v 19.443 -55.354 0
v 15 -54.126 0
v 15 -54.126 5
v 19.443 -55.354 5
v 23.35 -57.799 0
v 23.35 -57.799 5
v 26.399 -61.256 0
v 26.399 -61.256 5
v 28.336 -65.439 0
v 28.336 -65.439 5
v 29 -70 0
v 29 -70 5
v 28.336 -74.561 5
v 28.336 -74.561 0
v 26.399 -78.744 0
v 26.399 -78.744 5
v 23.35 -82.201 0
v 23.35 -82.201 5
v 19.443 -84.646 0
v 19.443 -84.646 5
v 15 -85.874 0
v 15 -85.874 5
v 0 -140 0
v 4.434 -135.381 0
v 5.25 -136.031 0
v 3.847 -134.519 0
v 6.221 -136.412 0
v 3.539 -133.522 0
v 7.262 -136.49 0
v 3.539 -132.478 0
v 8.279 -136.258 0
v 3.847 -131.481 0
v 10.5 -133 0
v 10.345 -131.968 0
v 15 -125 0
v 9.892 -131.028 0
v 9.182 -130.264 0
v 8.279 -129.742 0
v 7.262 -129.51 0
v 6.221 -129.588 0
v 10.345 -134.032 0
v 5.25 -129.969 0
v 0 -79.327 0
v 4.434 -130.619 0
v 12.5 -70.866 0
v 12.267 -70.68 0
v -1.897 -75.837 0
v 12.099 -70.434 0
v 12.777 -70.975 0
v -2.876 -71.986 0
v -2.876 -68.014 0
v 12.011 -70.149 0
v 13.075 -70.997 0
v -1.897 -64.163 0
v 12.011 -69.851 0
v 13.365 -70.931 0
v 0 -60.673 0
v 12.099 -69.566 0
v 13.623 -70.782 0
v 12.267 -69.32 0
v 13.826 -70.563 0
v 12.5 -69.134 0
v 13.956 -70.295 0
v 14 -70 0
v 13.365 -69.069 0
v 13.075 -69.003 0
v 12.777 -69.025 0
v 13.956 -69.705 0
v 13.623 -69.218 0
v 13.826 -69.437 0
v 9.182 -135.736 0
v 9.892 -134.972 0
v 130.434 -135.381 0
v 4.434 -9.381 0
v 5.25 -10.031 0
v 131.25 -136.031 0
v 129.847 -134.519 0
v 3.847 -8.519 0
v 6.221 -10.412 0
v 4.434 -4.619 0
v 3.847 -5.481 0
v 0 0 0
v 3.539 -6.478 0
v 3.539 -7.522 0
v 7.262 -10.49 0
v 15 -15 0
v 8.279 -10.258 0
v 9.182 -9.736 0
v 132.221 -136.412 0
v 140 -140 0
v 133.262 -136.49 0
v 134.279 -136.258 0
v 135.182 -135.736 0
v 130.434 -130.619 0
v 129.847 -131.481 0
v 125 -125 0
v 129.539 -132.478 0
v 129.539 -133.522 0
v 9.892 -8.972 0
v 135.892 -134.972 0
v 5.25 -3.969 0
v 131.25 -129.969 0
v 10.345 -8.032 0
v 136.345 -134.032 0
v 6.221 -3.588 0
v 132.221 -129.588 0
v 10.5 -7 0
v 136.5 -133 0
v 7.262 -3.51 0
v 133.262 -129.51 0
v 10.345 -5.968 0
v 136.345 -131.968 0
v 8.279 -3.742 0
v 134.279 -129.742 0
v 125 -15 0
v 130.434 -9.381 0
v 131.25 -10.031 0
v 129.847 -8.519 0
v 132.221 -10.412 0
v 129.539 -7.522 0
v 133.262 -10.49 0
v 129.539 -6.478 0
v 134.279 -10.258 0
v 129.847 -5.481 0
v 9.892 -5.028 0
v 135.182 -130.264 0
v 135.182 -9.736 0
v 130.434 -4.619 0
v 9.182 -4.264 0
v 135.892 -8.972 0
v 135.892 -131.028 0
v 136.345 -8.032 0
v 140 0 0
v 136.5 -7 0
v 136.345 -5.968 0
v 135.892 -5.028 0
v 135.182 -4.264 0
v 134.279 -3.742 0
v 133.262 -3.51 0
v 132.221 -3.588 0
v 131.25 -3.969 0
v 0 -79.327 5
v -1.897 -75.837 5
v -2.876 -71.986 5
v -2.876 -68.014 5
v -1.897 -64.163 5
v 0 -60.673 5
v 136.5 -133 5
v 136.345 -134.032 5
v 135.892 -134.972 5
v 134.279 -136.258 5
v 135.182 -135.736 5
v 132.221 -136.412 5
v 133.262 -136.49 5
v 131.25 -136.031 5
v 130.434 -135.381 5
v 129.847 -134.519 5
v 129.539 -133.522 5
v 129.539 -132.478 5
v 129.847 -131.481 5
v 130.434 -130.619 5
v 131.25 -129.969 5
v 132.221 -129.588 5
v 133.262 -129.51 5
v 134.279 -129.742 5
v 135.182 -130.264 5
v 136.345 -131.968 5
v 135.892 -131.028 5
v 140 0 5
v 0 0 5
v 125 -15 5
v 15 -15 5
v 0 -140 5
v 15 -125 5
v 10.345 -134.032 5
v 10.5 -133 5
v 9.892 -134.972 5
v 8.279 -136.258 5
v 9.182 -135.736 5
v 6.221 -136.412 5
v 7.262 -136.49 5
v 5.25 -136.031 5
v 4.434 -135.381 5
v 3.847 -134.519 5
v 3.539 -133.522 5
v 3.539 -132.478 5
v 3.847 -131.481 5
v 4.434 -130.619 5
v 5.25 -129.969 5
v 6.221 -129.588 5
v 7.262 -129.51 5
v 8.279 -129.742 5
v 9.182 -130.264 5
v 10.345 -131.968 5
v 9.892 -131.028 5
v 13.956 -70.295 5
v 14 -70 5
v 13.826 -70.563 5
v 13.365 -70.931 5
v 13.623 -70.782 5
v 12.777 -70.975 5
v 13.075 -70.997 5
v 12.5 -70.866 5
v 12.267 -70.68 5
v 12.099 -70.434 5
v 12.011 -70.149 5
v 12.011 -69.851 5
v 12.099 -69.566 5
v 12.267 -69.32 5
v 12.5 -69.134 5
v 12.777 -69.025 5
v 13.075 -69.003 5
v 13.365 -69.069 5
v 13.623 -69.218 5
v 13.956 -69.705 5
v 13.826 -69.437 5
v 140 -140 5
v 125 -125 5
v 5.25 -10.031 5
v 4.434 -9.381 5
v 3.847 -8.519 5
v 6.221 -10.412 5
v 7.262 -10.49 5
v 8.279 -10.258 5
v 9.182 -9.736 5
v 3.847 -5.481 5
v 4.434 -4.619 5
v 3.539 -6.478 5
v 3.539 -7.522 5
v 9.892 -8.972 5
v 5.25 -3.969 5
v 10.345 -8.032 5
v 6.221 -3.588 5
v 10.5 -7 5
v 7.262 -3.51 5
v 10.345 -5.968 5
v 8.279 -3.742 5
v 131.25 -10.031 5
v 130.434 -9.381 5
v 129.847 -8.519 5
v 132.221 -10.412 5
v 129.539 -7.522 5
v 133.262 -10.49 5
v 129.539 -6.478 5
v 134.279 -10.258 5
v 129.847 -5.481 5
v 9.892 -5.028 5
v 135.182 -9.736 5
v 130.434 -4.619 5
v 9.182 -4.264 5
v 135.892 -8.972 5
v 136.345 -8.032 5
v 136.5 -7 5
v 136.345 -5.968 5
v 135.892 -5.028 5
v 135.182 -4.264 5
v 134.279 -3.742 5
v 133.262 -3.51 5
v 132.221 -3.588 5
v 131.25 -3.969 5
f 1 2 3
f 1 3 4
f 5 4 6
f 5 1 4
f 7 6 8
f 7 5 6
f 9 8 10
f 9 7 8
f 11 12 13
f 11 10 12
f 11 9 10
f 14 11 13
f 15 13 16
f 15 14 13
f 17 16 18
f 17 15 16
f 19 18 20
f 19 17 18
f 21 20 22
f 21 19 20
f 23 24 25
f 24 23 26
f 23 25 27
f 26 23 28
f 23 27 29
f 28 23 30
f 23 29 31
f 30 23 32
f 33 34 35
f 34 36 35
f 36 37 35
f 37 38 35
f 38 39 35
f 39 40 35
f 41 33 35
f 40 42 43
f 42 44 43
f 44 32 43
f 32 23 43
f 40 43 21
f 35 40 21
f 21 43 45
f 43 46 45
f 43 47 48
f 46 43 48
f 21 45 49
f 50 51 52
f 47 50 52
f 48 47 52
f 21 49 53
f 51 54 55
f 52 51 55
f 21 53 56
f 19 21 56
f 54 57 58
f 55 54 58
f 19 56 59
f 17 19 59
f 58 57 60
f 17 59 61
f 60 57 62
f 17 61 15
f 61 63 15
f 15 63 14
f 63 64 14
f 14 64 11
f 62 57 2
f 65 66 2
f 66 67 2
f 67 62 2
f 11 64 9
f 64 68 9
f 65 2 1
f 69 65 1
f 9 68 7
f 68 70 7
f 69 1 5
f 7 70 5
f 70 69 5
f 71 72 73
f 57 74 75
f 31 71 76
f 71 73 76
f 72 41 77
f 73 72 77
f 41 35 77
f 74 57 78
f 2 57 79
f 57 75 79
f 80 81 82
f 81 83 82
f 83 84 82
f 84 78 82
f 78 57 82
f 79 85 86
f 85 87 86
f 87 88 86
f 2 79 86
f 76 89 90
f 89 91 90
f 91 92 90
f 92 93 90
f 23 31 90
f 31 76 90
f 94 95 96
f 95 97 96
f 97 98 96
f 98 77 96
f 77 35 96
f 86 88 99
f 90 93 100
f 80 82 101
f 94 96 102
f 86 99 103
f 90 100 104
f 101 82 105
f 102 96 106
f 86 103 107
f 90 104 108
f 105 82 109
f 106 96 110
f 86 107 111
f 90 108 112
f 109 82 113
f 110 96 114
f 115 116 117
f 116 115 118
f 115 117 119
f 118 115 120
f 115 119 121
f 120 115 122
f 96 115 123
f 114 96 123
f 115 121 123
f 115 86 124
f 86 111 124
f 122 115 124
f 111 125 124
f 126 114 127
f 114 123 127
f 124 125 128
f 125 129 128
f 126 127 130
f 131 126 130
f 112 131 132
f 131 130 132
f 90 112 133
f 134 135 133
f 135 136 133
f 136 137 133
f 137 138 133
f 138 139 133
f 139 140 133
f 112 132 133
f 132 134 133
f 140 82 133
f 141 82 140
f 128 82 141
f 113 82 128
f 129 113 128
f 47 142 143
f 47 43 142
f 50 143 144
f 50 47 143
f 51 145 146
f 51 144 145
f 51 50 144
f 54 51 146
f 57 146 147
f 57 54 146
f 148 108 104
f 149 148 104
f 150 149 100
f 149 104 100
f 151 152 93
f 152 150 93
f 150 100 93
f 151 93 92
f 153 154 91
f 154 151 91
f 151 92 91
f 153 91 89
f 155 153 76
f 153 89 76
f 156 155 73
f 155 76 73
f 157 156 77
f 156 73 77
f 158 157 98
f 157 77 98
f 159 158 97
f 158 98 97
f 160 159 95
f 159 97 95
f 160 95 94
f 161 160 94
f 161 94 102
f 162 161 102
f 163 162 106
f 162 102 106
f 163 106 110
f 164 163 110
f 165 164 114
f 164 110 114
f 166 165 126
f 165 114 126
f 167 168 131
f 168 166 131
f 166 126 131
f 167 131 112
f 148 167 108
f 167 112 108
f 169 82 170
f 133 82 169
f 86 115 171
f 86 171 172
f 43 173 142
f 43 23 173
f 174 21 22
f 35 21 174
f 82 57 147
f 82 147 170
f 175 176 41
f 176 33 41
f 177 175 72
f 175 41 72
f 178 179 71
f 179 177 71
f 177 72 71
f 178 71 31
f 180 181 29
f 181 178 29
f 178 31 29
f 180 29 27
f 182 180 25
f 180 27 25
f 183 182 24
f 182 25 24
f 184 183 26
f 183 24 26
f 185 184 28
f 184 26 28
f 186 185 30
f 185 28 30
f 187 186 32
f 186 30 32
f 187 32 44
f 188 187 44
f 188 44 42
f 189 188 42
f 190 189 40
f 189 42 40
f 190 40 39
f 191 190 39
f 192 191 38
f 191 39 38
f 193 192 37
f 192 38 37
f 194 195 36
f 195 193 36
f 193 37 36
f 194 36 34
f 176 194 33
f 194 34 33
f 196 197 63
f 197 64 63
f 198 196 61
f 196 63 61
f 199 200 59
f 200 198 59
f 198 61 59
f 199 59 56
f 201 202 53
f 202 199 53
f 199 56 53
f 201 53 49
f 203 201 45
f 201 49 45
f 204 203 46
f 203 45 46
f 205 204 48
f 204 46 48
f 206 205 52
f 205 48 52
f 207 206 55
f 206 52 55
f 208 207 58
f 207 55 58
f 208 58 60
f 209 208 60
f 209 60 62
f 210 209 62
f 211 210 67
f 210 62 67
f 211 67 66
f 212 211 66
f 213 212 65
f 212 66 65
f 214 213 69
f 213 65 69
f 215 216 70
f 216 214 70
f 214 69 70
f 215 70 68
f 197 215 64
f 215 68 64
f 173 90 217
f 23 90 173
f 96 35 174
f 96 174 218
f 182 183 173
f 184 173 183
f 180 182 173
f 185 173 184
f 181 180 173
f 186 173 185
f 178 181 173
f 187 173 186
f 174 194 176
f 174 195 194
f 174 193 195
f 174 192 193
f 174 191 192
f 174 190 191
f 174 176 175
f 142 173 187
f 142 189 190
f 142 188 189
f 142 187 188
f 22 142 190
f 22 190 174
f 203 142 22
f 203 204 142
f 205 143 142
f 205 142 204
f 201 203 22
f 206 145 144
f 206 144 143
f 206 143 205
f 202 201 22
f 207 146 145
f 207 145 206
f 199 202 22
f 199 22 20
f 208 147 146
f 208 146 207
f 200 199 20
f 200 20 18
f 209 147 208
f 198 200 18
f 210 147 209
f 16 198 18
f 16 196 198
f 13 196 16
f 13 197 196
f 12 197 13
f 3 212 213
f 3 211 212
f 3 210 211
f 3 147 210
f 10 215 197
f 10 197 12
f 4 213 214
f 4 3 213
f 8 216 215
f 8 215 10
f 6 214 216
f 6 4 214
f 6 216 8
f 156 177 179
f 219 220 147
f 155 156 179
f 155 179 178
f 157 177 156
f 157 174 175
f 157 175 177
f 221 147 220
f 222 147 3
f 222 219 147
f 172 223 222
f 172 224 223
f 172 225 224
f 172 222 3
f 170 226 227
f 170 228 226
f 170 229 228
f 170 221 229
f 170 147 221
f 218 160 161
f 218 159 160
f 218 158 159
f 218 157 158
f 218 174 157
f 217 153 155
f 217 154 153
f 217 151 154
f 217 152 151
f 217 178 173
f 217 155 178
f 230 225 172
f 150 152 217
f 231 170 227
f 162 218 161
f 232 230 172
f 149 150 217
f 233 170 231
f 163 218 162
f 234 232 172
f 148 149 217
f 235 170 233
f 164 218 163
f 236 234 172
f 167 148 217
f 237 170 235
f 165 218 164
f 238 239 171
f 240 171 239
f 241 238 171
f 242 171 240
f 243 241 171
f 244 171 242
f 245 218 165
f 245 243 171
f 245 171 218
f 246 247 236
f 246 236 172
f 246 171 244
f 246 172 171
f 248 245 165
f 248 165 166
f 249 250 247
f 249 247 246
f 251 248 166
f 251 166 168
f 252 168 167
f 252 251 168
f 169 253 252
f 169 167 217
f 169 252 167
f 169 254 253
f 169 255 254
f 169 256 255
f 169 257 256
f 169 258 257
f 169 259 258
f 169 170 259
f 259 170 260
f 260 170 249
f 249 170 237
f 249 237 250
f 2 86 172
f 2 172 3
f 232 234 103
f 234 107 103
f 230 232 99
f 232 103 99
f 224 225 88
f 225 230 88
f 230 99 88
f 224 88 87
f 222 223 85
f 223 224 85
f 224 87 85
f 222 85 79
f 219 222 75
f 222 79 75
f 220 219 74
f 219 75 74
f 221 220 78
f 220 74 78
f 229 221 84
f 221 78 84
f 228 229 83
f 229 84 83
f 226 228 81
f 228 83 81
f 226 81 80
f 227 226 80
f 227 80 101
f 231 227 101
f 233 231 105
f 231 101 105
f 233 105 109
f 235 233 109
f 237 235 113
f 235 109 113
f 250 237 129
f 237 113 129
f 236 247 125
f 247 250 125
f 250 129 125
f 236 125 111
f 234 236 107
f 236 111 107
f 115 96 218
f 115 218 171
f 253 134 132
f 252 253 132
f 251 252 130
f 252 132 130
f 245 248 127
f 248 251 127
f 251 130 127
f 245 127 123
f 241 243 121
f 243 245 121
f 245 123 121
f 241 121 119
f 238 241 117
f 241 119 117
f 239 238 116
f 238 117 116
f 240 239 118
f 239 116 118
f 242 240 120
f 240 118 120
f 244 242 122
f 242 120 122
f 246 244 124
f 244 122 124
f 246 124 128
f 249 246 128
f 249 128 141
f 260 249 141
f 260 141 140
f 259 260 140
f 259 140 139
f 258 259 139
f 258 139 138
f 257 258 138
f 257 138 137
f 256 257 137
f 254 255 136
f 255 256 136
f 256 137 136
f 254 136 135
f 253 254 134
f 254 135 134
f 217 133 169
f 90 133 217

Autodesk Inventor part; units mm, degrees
ref_plane "YZ Plane" through (0, 0, 0) normal (1, 0, 0) x (0, 1, 0)
ref_plane "XZ Plane" through (0, 0, 0) normal (0, 1, 0) x (-1, 0, 0)
ref_plane "XY Plane" through (0, 0, 0) normal (0, 0, 1) x (1, 0, 0)
sketch "Boceto1" plane through (0, 0, 0) normal (0, 0, 1) x (1, 0, 0)
  circle A0 centre (812.7165, -188.8432) radius 3.5
  circle A1 centre (938.7165, -188.8432) radius 3.5
  circle A2 centre (812.7165, -314.8432) radius 3.5
  circle A3 centre (938.7165, -314.8432) radius 3.5
  circle A4 centre (7, -133) radius 3.5
  circle A5 centre (7, -7) radius 3.5
  circle A6 centre (133, -133) radius 3.5
  circle A7 centre (133, -7) radius 3.5
  circle A8 centre (742.932, -379.7007) radius 3.5
  circle A9 centre (684.4665, -289.064) radius 3.5
  line L0 (643.3746, -238.0566) -> (643.3746, -186.384)
  line L1 (643.3746, -186.384) -> (658.3746, -186.384)
  line L2 (658.3746, -186.384) -> (658.3746, -231.5095)
  circle A10 centre (650.6272, -198.084) radius 3.5
  line L3 (930.7165, -299.4631) -> (930.7165, -313.8432)
  line L4 (930.7165, -313.8432) -> (820.7165, -313.8432)
  line L5 (820.7165, -313.8432) -> (820.7165, -299.8432)
  line L6 (820.7165, -299.8432) -> (820.7165, -267.7177)
  arc A11 (802.6937, -413.4304) -> (798.6937, -413.4304) centre (800.6937, -413.4304) ccw
  line L7 (802.6937, -413.4304) -> (802.6937, -450.6101)
  arc A12 (798.6937, -450.6101) -> (802.6937, -450.6101) centre (800.6937, -450.6101) ccw
  line L8 (798.6937, -450.6101) -> (798.6937, -413.4304)
  line L9 (899.1229, -399.4144) -> (899.1229, -391.9144)
  line L10 (899.1229, -391.9144) -> (815.1529, -391.9144)
  arc A13 (812.4407, -391.5396) -> (815.1529, -391.9144) centre (815.1529, -381.9144) ccw
  line L11 (812.4407, -391.5396) -> (788.253, -384.724)
  arc A14 (788.253, -384.724) -> (786.3475, -384.3818) centre (785.5409, -394.3492) ccw
  arc A15 (784.4303, -384.0363) -> (786.3475, -384.3818) centre (787.1541, -374.4144) ccw
  line L12 (718.1963, -348.8257) -> (755.3759, -348.8257)
  arc A16 (755.3759, -348.8257) -> (755.3759, -344.8257) centre (755.3759, -346.8257) ccw
  line L13 (755.3759, -344.8257) -> (718.1963, -344.8257)
  arc A17 (718.1963, -344.8257) -> (718.1963, -348.8257) centre (718.1963, -346.8257) ccw
  line L14 (0, -60.6726) -> (0, 0)
  line L15 (0, 0) -> (140, 0)
  line L16 (140, 0) -> (140, -140)
  line L17 (140, -140) -> (0, -140)
  line L18 (0, -140) -> (0, -79.3274)
  line L19 (15, -85.8745) -> (15, -125)
  line L20 (15, -125) -> (125, -125)
  line L21 (125, -125) -> (125, -15)
  line L22 (125, -15) -> (15, -15)
  line L23 (15, -15) -> (15, -54.1255)
  line L24 (-993.9843, 33.9517) -> (-715.1465, 33.9517)
  line L25 (-715.1465, 33.9517) -> (-715.1465, -156.5278)
  line L26 (-715.1465, -156.5278) -> (-993.9843, -156.5278)
  line L27 (-993.9843, -156.5278) -> (-993.9843, 33.9517)
  circle A18 centre (-961.4218, 1.0641) radius 2.5
  circle A19 centre (-835.4218, 1.0641) radius 2.5
  circle A20 centre (-961.4218, -124.9359) radius 2.5
  circle A21 centre (-835.4218, -124.9359) radius 2.5
  line L28 (-1001.1961, 41.4488) -> (-685.1452, 41.4488)
  line L29 (-685.1452, 41.4488) -> (-685.1452, -163.7638)
  line L30 (-685.1452, -163.7638) -> (-1001.1961, -163.7638)
  line L31 (-1001.1961, -163.7638) -> (-1001.1961, 41.4488)
  circle A22 centre (938.6116, -461.4421) radius 3.5
  line L32 (832.2485, -453.4421) -> (930.6116, -453.4421)
  line L33 (930.6116, -453.4421) -> (930.6116, -414.3166)
  line L34 (832.2485, -468.4421) -> (832.2485, -453.4421)
  line L35 (832.2485, -328.4421) -> (945.6116, -328.4421)
  line L36 (945.6116, -328.4421) -> (945.6116, -389.1147)
  line L37 (832.2485, -343.4421) -> (832.2485, -328.4421)
  circle A23 centre (938.6116, -335.4421) radius 3.5
  circle A24 centre (-821.7113, -229.9218) radius 8.1
  circle A25 centre (-864.2113, -229.9218) radius 3.25
  circle A26 centre (-839.0318, -229.9218) radius 3.25
  circle A27 centre (-932.7072, -191.2961) radius 3.25
  circle A28 centre (-915.3867, -191.2961) radius 8.1
  circle A29 centre (-957.8867, -191.2961) radius 3.25
  circle A30 centre (-864.0658, -191.0106) radius 3.25
  circle A31 centre (-838.8863, -191.0106) radius 3.25
  circle A32 centre (-821.5658, -191.0106) radius 8.1
  circle A33 centre (-881.7113, -229.9218) radius 7
  circle A34 centre (-974.6846, -229.7987) radius 7
  circle A35 centre (-957.1846, -229.7987) radius 3.25
  circle A36 centre (-932.0051, -229.7987) radius 3.25
  circle A37 centre (-914.6846, -229.7987) radius 8.1
  line L38 (-993.2367, -169.6143) -> (-798.5871, -169.6143)
  line L39 (-798.5871, -169.6143) -> (-798.5871, -253.6689)
  line L40 (-798.5871, -253.6689) -> (-993.2367, -253.6689)
  line L41 (-993.2367, -253.6689) -> (-993.2367, -169.6143)
  arc A38 (-924.0111, -244.6064) -> (-932.0051, -242.2987) centre (-932.0051, -257.2987) ccw
  line L42 (-932.0051, -242.2987) -> (-974.6846, -242.2987)
  arc A39 (-974.6846, -217.2987) -> (-974.6846, -242.2987) centre (-974.6846, -229.7987) ccw
  line L43 (-974.6846, -217.2987) -> (-932.0051, -217.2987)
  arc A40 (-932.0051, -217.2987) -> (-924.0111, -214.991) centre (-932.0051, -202.2987) ccw
  arc A41 (-924.0111, -244.6064) -> (-924.0111, -214.991) centre (-914.6846, -229.7987) ccw
  arc A42 (-881.7113, -217.4218) -> (-881.7113, -242.4218) centre (-881.7113, -229.9218) ccw
  line L44 (-881.7113, -217.4218) -> (-839.0318, -217.4218)
  arc A43 (-839.0318, -217.4218) -> (-831.0377, -215.1141) centre (-839.0318, -202.4218) ccw
  arc A44 (-831.0377, -244.7295) -> (-831.0377, -215.1141) centre (-821.7113, -229.9218) ccw
  arc A45 (-831.0377, -244.7295) -> (-839.0318, -242.4218) centre (-839.0318, -257.4218) ccw
  line L45 (-839.0318, -242.4218) -> (-881.7113, -242.4218)
  line L46 (-966.6367, -196.3479) -> (-975.3867, -201.3997)
  line L47 (-975.3867, -201.3997) -> (-984.1367, -196.3479)
  line L48 (-984.1367, -196.3479) -> (-984.1367, -186.2443)
  line L49 (-984.1367, -186.2443) -> (-975.3867, -181.1925)
  line L50 (-975.3867, -181.1925) -> (-966.6367, -186.2443)
  line L51 (-966.6367, -186.2443) -> (-966.6367, -196.3479)
  arc A46 (-924.7131, -206.1038) -> (-924.7131, -176.4884) centre (-915.3867, -191.2961) ccw
  arc A47 (-932.7072, -178.7961) -> (-924.7131, -176.4884) centre (-932.7072, -163.7961) ccw
  line L52 (-932.7072, -178.7961) -> (-975.3867, -178.7961)
  arc A48 (-975.3867, -178.7961) -> (-975.3867, -203.7961) centre (-975.3867, -191.2961) ccw
  line L53 (-975.3867, -203.7961) -> (-932.7072, -203.7961)
  arc A49 (-924.7131, -206.1038) -> (-932.7072, -203.7961) centre (-932.7072, -218.7961) ccw
  line L54 (-881.5658, -203.5106) -> (-838.8863, -203.5106)
  arc A50 (-830.8922, -205.8183) -> (-838.8863, -203.5106) centre (-838.8863, -218.5106) ccw
  arc A51 (-830.8922, -205.8183) -> (-830.8922, -176.2029) centre (-821.5658, -191.0106) ccw
  arc A52 (-838.8863, -178.5106) -> (-830.8922, -176.2029) centre (-838.8863, -163.5106) ccw
  line L55 (-838.8863, -178.5106) -> (-881.5658, -178.5106)
  arc A53 (-881.5658, -178.5106) -> (-881.5658, -203.5106) centre (-881.5658, -191.0106) ccw
  line L56 (-890.3158, -185.9588) -> (-881.5658, -180.907)
  line L57 (-881.5658, -180.907) -> (-872.8158, -185.9588)
  line L58 (-872.8158, -185.9588) -> (-872.8158, -196.0624)
  line L59 (-872.8158, -196.0624) -> (-881.5658, -201.1142)
  line L60 (-881.5658, -201.1142) -> (-890.3158, -196.0624)
  line L61 (-890.3158, -196.0624) -> (-890.3158, -185.9588)
  arc A54 (0, -60.6726) -> (0, -79.3274) centre (13, -70) ccw
  arc A55 (643.3746, -238.0566) -> (643.3746, -256.7114) centre (656.3746, -247.384) ccw
  arc A56 (805.7165, -242.5158) -> (805.7165, -261.1706) centre (818.7165, -251.8432) ccw
  arc A57 (679.4665, -307.4948) -> (688.8022, -330.5623) centre (693.4587, -315.2549) ccw
  arc A58 (930.6116, -382.5675) -> (930.6116, -414.3166) centre (932.6116, -398.4421) ccw
  arc A59 (753.3527, -391.3948) -> (780.9993, -399.4144) centre (769.1229, -388.6929) ccw
  arc A60 (15, -85.8745) -> (15, -54.1255) centre (13, -70) ccw
  line L62 (679.4665, -307.4948) -> (679.4665, -282.064)
  line L63 (679.4665, -282.064) -> (694.4606, -282.064)
  line L64 (694.4606, -282.064) -> (694.4606, -293.9069)
  arc A61 (694.4606, -293.9069) -> (696.1607, -299.4847) centre (704.4606, -293.9069) ccw
  line L65 (704.1803, -327.1313) -> (704.1803, -331.9041)
  arc A62 (704.1803, -331.9041) -> (704.5551, -334.6163) centre (714.1803, -331.9041) ccw
  line L66 (704.5551, -334.6163) -> (706.8683, -342.8257)
  line L67 (706.8683, -342.8257) -> (758.8683, -342.8257)
  arc A63 (758.8683, -350.8257) -> (758.8683, -342.8257) centre (759.1244, -346.8257) ccw
  line L68 (758.8683, -350.8257) -> (709.1225, -350.8257)
  line L69 (709.1225, -350.8257) -> (711.3055, -358.5727)
  arc A64 (711.6803, -361.2849) -> (711.3055, -358.5727) centre (701.6803, -361.2849) ccw
  line L70 (711.6803, -361.2849) -> (711.6803, -445.2549)
  line L71 (711.6803, -445.2549) -> (696.6803, -445.2549)
  line L72 (696.6803, -445.2549) -> (696.6803, -361.2849)
  arc A65 (696.6803, -361.2849) -> (696.3055, -358.5727) centre (686.6803, -361.2849) ccw
  line L73 (696.3055, -358.5727) -> (689.4899, -334.385)
  arc A66 (689.1477, -332.4795) -> (689.4899, -334.385) centre (699.1151, -331.6729) ccw
  arc A67 (689.1477, -332.4795) -> (688.8022, -330.5623) centre (679.1803, -333.2861) ccw
  arc A68 (704.1803, -327.1313) -> (696.1607, -299.4847) centre (693.4587, -315.2549) ccw
  line L74 (820.7165, -235.9687) -> (820.7165, -189.8432)
  line L75 (820.7165, -189.8432) -> (930.7165, -189.8432)
  line L76 (930.7165, -189.8432) -> (930.7165, -243.3432)
  line L77 (930.7165, -243.3432) -> (945.7165, -243.3432)
  line L78 (945.7165, -243.3432) -> (945.7165, -181.8432)
  line L79 (945.7165, -181.8432) -> (805.7165, -181.8432)
  line L80 (805.7165, -181.8432) -> (805.7165, -242.5158)
  line L81 (805.7165, -261.1706) -> (805.7165, -321.8432)
  line L82 (805.7165, -321.8432) -> (945.7165, -321.8432)
  line L83 (945.7165, -321.8432) -> (945.7165, -260.3432)
  line L84 (945.7165, -260.3432) -> (930.7165, -260.3432)
  line L85 (930.7165, -260.3432) -> (930.7165, -299.8432)
  arc A69 (820.7165, -267.7177) -> (820.7165, -235.9687) centre (818.7165, -251.8432) ccw
  line L86 (670.5079, -239.884) -> (793.3746, -239.884)
  line L87 (793.3746, -239.884) -> (793.3746, -254.884)
  line L88 (793.3746, -254.884) -> (670.5079, -254.884)
  line L89 (658.3746, -263.2585) -> (658.3746, -308.384)
  line L90 (658.3746, -308.384) -> (643.3746, -308.384)
  line L91 (643.3746, -308.384) -> (643.3746, -256.7114)
  arc A70 (658.3746, -263.2585) -> (670.5079, -254.884) centre (656.3746, -247.384) ccw
  arc A71 (670.5079, -239.884) -> (658.3746, -231.5095) centre (656.3746, -247.384) ccw
  line L92 (945.6116, -407.7694) -> (945.6116, -468.4421)
  line L93 (945.6116, -468.4421) -> (832.2485, -468.4421)
  line L94 (930.6116, -382.5675) -> (930.6116, -343.4421)
  line L95 (930.6116, -343.4421) -> (832.2485, -343.4421)
  arc A72 (945.6116, -407.7694) -> (945.6116, -389.1147) centre (932.6116, -398.4421) ccw
  line L96 (780.9993, -399.4144) -> (785.7722, -399.4144)
  arc A73 (788.4843, -399.7892) -> (785.7722, -399.4144) centre (785.7722, -409.4144) ccw
  line L97 (788.4843, -399.7892) -> (796.6937, -402.1024)
  line L98 (796.6937, -402.1024) -> (796.6937, -454.1024)
  arc A74 (796.6937, -454.1024) -> (804.6937, -454.1024) centre (800.6937, -454.3585) ccw
  line L99 (804.6937, -454.1024) -> (804.6937, -404.3566)
  line L100 (804.6937, -404.3566) -> (812.4407, -406.5396)
  arc A75 (812.4407, -406.5396) -> (815.1529, -406.9144) centre (815.1529, -396.9144) ccw
  line L101 (815.1529, -406.9144) -> (899.1229, -406.9144)
  line L102 (899.1229, -406.9144) -> (899.1229, -391.9144)
  line L103 (761.3628, -374.7007) -> (735.932, -374.7007)
  line L104 (735.932, -374.7007) -> (735.932, -389.6948)
  line L105 (735.932, -389.6948) -> (747.775, -389.6948)
  arc A76 (753.3527, -391.3948) -> (747.775, -389.6948) centre (747.775, -399.6948) ccw
  arc A77 (784.4303, -384.0363) -> (761.3628, -374.7007) centre (769.1229, -388.6929) ccw
  line L106 (930.7165, -243.3432) -> (930.7165, -260.3432)
  line L107 (945.7165, -243.3432) -> (945.7165, -260.3432)
  line L108 (628.631, -19.6698) -> (960.631, -19.6698)
  line L109 (960.631, -19.6698) -> (960.631, -482.6698)
  line L110 (960.631, -482.6698) -> (628.631, -482.6698)
  line L111 (628.631, -482.6698) -> (628.631, -19.6698)
  circle A78 centre (13, -70) radius 1
  point P0 (0, -463)
  point P1 (332, -463)
  point P2 (332, 0)
  point P3 (50.8356, -262.3941)
  point P4 (65.8296, -262.3941)
  point P5 (65.8296, -274.2371)
  point P6 (67.5297, -279.8148)
  point P7 (75.5493, -307.4614)
  point P8 (75.5493, -312.2343)
  point P9 (75.9241, -314.9465)
  point P10 (78.2373, -323.1558)
  point P11 (130.2373, -323.1558)
  point P12 (130.2373, -331.1558)
  point P13 (80.4915, -331.1558)
  point P14 (82.6745, -338.9029)
  point P15 (83.0493, -341.615)
  point P16 (83.0493, -425.585)
  point P17 (68.0493, -425.585)
  point P18 (68.0493, -341.615)
  point P19 (67.6745, -338.9029)
  point P20 (60.8589, -314.7152)
  point P21 (60.5167, -312.8096)
  point P22 (60.1712, -310.8924)
  point P23 (50.8356, -287.825)
  point P24 (316.9806, -388.0996)
  point P25 (316.9806, -448.7722)
  point P26 (203.6175, -448.7722)
  point P27 (203.6175, -433.7722)
  point P28 (301.9806, -433.7722)
  point P29 (301.9806, -394.6467)
  point P30 (301.9806, -362.8977)
  point P31 (301.9806, -323.7722)
  point P32 (203.6175, -323.7722)
  point P33 (203.6175, -308.7722)
  point P34 (316.9806, -308.7722)
  point P35 (316.9806, -369.4448)
  point P36 (15.3452, -75.2432)
  point P37 (15.3452, -14.5706)
  point P38 (155.3452, -14.5706)
  point P39 (155.3452, -154.5706)
  point P40 (15.3452, -154.5706)
  point P41 (15.3452, -93.898)
  point P42 (178.1524, -75.2432)
  point P43 (178.1524, -14.5706)
  point P44 (318.1524, -14.5706)
  point P45 (318.1524, -154.5706)
  point P46 (178.1524, -154.5706)
  point P47 (178.1524, -93.898)
  point P48 (29.7436, -243.5887)
  point P49 (29.7436, -288.7142)
  point P50 (14.7436, -288.7142)
  point P51 (14.7436, -237.0415)
  point P52 (14.7436, -218.3868)
  point P53 (14.7436, -166.7142)
  point P54 (29.7436, -166.7142)
  point P55 (29.7436, -211.8397)
  point P56 (41.8769, -220.2142)
  point P57 (164.7436, -220.2142)
  point P58 (164.7436, -235.2142)
  point P59 (41.8769, -235.2142)
  point P60 (186.5219, -372.2445)
  point P61 (270.4919, -372.2445)
  point P62 (270.4919, -379.7445)
  point P63 (270.4919, -387.2445)
  point P64 (186.5219, -387.2445)
  point P65 (183.8098, -386.8697)
  point P66 (176.0627, -384.6868)
  point P67 (176.0627, -434.4326)
  point P68 (168.0627, -434.4326)
  point P69 (168.0627, -382.4326)
  point P70 (159.8533, -380.1194)
  point P71 (157.1412, -379.7445)
  point P72 (152.3683, -379.7445)
  point P73 (124.7217, -371.725)
  point P74 (119.144, -370.0249)
  point P75 (107.301, -370.0249)
  point P76 (107.301, -355.0308)
  point P77 (132.7318, -355.0308)
  point P78 (155.7993, -364.3664)
  point P79 (157.7165, -364.712)
  point P80 (159.622, -365.0542)
  point P81 (183.8098, -371.8697)
  point P82 (317.0855, -240.6733)
  point P83 (317.0855, -302.1733)
  point P84 (177.0855, -302.1733)
  point P85 (177.0855, -241.5007)
  point P86 (177.0855, -222.846)
  point P87 (177.0855, -162.1733)
  point P88 (317.0855, -162.1733)
  point P89 (317.0855, -223.6733)
  dimension "d10" = 316.0509
  dimension "d11" = 295.1177
  dimension "d12" = 2
extrude "Extrusión2" add sketch "Boceto1" along normal blind 5 contours L14 L15 L16 L17 L18 A54
properties part number "P2"
